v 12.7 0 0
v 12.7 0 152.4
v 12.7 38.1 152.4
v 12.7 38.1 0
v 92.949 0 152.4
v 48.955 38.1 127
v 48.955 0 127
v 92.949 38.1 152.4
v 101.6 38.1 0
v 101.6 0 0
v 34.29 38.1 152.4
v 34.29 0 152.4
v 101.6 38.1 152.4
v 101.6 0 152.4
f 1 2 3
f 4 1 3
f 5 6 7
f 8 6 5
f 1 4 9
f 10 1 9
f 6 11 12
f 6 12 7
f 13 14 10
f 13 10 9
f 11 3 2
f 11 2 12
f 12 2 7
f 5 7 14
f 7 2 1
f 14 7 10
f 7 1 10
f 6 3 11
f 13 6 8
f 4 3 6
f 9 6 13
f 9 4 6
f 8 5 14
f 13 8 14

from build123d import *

# Parameters (mm, degrees)
SKETCH2_W               = 101.6
SKETCH2_H               = 50.8
BOSS_EXTRUDE1_DEPTH     = 152.4
CUT_EXTRUDE1_DEPTH      = 191.076195248
CUT_EXTRUDE1_DEPTH_BACK = 191.076195248
CUT_EXTRUDE2_DEPTH      = 191.076195248
CUT_EXTRUDE2_DEPTH_BACK = 191.076195248
SKETCH4_W               = 67.31
SKETCH4_H               = 12.7


with BuildPart() as part:
    # Sketch2 → Boss-Extrude1 (new body)
    with BuildSketch(Plane.XY):
        with Locations((50.8, 25.4)):
            Rectangle(SKETCH2_W, SKETCH2_H)
    extrude(amount=BOSS_EXTRUDE1_DEPTH)

    # Sketch3 → Cut-Extrude1 (cut, two sides: drawn at the far end of the back side and taken through both)
    with BuildSketch(Plane.XZ.offset(-CUT_EXTRUDE1_DEPTH_BACK)):
        Polygon((-149.218366946, 470.245815165), (34.29, 152.4), (48.954696837, 127), (92.94878735, 152.4), (410.794602514, 335.908366946), (582.019022435, 1049.69217865), (22.006052975, 1184.029626869), align=None)
    extrude(amount=CUT_EXTRUDE1_DEPTH + CUT_EXTRUDE1_DEPTH_BACK, mode=Mode.SUBTRACT)

    # Sketch4 → Cut-Extrude2 (cut, two sides: drawn at the far end of the back side and taken through both)
    with BuildSketch(Plane.XY.offset(152.4).offset(-CUT_EXTRUDE2_DEPTH_BACK)):
        Polygon((0, 0), (12.7, 0), (12.7, 38.1), (34.29, 38.1), (34.29, 50.8), (0, 50.8), align=None)
        with Locations((67.945, 44.45)):
            Rectangle(SKETCH4_W, SKETCH4_H)
    extrude(amount=CUT_EXTRUDE2_DEPTH + CUT_EXTRUDE2_DEPTH_BACK, mode=Mode.SUBTRACT)


solid = part.part
